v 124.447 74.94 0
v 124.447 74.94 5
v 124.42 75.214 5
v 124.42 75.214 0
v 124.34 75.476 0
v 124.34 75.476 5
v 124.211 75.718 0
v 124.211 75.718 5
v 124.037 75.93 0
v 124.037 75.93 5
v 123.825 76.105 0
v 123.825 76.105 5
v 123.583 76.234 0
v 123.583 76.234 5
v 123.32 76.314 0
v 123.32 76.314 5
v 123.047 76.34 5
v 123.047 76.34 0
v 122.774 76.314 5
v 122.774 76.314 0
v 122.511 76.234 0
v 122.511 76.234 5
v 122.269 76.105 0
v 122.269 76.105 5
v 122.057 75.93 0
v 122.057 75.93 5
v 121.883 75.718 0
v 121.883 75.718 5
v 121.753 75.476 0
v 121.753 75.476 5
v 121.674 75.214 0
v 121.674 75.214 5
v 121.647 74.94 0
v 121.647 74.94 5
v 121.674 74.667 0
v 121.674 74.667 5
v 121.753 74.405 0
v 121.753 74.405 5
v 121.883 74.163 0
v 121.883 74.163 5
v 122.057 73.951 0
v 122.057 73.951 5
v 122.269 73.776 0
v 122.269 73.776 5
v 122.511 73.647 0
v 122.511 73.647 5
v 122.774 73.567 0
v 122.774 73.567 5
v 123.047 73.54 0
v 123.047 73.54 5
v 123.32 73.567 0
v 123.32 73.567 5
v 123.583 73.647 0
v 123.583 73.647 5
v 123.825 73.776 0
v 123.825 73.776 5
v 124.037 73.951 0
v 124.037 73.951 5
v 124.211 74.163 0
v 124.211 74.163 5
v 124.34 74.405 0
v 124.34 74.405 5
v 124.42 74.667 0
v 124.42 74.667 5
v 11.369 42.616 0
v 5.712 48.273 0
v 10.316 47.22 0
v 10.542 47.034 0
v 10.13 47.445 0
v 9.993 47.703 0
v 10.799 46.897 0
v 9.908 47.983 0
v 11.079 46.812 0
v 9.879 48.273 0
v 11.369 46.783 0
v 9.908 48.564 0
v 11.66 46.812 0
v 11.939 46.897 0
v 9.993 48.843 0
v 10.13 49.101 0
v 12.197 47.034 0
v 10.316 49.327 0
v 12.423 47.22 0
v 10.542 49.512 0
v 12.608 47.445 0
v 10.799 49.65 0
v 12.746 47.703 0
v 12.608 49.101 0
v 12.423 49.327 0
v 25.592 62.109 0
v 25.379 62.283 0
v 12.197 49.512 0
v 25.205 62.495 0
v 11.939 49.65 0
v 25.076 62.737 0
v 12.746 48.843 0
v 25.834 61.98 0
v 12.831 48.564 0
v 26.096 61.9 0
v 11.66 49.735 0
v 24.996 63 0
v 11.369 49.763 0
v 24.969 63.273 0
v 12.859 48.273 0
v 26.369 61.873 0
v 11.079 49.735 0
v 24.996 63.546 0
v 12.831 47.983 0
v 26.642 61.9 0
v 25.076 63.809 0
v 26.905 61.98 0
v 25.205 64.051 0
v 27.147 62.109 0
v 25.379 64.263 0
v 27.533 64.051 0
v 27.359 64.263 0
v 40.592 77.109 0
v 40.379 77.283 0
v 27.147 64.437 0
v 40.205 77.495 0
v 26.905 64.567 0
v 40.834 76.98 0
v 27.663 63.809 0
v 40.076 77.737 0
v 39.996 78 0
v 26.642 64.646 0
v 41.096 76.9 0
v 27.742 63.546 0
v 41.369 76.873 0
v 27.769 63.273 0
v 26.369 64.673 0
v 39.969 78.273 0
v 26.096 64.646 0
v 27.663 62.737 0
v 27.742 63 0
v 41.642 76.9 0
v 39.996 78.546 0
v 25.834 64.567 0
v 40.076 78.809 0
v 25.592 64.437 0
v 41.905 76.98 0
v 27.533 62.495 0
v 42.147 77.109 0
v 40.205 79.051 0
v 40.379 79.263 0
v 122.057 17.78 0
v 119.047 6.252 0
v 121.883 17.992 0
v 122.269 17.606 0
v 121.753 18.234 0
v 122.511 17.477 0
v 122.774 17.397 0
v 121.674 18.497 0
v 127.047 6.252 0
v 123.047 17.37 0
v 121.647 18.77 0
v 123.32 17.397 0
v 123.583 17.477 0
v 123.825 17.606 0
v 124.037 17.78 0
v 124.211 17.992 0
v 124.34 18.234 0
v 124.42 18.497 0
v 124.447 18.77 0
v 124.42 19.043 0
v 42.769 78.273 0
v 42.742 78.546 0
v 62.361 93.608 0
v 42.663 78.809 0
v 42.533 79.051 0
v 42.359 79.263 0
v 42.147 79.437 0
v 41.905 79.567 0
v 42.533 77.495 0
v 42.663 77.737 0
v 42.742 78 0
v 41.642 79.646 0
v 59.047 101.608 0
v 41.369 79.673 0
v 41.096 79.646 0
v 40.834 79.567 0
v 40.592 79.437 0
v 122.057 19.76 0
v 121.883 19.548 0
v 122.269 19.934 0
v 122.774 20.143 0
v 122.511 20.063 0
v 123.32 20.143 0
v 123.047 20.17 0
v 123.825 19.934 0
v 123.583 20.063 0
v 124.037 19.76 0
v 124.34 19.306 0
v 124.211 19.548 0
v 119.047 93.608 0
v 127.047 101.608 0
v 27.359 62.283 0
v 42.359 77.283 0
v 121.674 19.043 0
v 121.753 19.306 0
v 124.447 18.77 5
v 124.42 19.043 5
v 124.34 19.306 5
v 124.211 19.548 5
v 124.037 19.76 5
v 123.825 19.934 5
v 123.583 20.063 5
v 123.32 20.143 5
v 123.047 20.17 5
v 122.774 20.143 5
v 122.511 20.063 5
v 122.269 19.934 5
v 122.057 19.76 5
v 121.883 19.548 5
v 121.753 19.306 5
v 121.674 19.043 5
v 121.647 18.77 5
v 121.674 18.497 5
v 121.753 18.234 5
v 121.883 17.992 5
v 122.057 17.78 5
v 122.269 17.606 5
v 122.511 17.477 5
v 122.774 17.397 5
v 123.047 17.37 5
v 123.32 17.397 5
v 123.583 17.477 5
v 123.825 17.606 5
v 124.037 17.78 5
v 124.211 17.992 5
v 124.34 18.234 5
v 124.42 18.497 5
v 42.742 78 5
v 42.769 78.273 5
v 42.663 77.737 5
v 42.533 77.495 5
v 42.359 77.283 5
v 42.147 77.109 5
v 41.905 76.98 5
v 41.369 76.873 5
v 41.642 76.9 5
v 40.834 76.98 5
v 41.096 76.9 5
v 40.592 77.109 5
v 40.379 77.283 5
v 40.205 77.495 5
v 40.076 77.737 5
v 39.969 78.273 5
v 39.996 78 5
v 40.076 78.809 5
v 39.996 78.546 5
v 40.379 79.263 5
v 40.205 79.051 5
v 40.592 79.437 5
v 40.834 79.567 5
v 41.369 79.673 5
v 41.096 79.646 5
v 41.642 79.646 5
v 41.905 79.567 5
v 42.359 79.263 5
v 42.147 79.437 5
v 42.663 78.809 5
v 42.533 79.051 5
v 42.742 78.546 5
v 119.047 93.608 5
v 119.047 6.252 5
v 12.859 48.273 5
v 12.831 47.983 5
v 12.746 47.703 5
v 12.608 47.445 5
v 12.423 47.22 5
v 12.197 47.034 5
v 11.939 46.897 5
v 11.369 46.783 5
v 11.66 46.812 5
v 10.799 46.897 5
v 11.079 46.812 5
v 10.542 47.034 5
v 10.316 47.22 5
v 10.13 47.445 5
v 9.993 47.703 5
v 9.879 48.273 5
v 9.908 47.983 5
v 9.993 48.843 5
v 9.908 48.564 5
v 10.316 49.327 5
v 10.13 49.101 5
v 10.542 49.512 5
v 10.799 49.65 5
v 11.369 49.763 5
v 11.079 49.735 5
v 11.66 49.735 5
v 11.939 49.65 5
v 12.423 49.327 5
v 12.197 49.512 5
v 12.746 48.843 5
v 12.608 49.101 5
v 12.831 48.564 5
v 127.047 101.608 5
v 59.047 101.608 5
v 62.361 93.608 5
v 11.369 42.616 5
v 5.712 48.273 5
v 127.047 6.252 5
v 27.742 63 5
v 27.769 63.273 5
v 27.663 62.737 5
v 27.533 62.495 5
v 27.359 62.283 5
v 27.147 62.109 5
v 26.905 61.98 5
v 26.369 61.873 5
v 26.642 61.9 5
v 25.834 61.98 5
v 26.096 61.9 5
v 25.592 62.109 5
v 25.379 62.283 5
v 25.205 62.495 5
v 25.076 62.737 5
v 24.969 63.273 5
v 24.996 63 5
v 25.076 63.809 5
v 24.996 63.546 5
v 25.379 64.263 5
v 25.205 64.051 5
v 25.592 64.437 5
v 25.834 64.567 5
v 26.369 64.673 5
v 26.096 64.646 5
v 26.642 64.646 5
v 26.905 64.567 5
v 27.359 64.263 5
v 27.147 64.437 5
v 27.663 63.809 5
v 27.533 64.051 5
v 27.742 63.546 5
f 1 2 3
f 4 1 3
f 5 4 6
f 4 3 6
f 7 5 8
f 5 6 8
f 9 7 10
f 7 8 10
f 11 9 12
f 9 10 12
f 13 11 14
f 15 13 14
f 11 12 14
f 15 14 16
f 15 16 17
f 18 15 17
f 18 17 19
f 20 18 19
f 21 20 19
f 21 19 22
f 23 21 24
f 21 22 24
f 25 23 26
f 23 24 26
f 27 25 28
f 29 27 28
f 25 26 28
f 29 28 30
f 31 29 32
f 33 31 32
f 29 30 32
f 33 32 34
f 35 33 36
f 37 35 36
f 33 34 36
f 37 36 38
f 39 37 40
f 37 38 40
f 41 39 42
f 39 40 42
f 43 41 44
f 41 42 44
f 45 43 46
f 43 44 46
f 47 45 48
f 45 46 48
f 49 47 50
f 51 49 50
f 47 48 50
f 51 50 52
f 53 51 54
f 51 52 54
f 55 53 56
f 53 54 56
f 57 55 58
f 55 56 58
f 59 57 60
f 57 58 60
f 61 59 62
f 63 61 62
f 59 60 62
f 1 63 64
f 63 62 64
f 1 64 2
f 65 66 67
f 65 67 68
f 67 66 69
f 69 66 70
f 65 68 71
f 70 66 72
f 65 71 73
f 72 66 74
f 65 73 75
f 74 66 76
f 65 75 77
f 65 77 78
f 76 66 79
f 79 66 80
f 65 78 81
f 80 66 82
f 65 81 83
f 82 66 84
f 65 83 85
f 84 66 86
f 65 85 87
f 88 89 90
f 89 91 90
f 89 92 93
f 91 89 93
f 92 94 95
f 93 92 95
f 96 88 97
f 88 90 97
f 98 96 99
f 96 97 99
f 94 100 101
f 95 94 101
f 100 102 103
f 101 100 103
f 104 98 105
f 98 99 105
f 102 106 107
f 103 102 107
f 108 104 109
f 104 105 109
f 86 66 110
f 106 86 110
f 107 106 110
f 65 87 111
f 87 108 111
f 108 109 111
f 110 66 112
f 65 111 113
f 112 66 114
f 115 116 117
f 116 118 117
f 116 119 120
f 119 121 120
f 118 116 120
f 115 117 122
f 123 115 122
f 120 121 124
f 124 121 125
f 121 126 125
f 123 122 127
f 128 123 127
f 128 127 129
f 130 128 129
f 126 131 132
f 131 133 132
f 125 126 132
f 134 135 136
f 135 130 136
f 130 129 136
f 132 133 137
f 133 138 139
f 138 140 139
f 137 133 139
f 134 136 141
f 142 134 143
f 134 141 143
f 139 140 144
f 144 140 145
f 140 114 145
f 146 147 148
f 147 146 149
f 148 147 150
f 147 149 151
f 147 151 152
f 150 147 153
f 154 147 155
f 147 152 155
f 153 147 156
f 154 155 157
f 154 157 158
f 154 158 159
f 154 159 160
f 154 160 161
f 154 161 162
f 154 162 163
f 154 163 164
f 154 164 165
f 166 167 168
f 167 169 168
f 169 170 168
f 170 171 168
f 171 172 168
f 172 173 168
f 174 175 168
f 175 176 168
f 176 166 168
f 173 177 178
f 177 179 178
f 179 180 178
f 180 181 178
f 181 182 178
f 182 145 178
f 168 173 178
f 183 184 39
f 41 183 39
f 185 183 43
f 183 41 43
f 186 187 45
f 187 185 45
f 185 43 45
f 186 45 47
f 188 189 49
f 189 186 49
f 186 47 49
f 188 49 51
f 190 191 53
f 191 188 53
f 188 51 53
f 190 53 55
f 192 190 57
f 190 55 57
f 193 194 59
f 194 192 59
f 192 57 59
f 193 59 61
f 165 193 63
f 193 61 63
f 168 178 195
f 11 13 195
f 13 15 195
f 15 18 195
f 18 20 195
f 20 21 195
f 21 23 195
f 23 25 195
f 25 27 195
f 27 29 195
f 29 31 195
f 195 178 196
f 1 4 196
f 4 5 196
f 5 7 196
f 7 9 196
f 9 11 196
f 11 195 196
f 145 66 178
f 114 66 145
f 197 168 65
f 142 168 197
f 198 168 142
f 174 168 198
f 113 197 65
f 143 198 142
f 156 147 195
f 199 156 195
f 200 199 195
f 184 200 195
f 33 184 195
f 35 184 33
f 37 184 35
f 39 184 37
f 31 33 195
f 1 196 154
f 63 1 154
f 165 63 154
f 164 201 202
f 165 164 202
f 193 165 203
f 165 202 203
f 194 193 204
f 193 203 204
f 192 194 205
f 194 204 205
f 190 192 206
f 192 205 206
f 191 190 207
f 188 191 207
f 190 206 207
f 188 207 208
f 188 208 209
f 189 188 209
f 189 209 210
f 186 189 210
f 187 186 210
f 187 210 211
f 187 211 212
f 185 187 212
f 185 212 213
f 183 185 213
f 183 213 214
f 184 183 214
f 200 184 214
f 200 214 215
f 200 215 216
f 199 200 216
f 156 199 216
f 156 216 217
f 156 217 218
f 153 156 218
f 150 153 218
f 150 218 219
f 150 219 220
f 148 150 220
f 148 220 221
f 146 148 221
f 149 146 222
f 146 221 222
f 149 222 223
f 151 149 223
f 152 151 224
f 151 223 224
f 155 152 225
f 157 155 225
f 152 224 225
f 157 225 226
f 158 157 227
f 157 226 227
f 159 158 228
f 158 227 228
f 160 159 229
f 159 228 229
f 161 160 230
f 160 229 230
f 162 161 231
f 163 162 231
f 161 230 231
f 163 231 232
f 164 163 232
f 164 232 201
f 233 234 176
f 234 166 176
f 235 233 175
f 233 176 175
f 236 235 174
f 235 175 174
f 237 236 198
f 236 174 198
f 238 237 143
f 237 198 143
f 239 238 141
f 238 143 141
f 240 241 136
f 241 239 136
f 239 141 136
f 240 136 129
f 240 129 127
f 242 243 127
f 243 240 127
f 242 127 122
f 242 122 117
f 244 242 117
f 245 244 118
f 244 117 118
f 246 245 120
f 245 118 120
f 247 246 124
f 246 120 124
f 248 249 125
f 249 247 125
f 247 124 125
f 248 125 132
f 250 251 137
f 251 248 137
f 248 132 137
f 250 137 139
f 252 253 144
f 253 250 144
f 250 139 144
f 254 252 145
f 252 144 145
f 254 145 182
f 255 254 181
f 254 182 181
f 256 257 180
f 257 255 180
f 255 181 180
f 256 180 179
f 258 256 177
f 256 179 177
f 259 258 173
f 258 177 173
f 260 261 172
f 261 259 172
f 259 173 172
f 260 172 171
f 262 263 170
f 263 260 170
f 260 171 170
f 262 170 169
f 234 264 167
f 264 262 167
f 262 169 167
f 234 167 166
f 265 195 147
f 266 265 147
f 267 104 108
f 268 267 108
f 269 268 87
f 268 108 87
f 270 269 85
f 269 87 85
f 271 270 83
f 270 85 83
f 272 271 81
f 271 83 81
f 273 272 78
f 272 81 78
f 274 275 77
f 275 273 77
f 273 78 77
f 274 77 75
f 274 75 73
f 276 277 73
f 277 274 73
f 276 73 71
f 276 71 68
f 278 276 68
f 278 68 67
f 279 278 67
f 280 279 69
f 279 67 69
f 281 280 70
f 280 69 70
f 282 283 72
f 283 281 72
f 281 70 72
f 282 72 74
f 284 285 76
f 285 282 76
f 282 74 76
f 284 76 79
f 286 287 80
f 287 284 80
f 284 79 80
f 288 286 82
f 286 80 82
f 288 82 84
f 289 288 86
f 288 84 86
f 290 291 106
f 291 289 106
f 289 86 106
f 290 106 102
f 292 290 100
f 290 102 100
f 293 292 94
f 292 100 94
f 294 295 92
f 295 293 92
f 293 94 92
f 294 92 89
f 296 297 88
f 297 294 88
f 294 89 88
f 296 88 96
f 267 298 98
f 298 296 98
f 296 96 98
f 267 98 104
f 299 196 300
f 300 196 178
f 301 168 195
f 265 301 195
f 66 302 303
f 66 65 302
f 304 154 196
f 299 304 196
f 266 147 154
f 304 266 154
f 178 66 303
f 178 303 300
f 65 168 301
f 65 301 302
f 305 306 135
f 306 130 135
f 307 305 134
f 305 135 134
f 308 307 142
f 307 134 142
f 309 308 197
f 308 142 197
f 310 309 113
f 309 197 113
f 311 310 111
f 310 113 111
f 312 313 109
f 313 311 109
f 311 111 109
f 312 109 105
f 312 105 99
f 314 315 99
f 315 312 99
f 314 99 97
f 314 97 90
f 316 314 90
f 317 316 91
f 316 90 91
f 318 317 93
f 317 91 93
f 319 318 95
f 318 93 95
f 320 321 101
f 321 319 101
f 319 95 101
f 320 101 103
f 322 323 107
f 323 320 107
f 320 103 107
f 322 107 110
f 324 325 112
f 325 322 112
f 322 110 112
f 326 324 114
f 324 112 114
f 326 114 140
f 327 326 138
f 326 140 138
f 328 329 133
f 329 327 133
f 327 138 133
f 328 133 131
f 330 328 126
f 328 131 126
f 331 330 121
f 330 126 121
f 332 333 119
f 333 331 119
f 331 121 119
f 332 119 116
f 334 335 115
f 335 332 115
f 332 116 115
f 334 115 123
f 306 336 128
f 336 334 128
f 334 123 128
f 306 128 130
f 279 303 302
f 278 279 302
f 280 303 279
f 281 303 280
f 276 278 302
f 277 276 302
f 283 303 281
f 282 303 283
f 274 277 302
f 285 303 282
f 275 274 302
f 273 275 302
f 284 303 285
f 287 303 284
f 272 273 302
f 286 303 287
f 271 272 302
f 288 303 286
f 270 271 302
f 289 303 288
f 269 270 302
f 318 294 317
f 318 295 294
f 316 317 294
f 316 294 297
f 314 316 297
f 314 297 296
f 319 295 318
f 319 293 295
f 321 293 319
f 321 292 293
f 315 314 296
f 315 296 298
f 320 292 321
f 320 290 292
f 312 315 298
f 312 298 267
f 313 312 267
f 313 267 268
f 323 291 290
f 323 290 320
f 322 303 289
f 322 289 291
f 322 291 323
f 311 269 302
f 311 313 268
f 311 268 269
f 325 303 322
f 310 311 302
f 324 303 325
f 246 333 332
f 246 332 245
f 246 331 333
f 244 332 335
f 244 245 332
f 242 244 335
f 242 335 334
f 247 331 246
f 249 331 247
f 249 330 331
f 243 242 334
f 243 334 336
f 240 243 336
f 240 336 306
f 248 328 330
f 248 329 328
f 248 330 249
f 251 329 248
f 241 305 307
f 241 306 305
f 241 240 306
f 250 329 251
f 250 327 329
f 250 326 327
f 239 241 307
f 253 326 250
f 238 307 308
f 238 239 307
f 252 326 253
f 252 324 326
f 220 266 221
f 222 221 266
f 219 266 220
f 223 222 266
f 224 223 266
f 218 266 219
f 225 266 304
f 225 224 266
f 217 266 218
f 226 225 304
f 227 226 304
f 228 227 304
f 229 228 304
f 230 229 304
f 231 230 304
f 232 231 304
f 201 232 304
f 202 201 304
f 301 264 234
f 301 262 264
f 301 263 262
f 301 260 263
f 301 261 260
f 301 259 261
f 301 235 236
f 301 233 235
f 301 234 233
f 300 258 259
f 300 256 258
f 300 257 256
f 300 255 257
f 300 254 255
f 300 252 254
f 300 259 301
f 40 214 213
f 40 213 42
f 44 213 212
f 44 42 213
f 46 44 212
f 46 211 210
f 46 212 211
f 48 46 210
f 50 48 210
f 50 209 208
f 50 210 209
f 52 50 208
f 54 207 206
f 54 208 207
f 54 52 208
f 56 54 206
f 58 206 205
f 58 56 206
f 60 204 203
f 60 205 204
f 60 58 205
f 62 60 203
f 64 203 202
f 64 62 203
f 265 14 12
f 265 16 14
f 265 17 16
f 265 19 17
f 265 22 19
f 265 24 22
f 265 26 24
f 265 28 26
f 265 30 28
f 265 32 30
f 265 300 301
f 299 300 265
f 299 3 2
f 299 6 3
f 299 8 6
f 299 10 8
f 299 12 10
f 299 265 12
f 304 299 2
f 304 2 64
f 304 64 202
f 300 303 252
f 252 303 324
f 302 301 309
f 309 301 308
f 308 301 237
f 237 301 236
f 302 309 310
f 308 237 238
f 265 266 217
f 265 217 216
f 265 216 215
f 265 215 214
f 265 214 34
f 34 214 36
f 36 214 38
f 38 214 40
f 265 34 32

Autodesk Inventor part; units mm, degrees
ref_plane "YZ Plane" through (0, 0, 0) normal (1, 0, 0) x (0, 1, 0)
ref_plane "XZ Plane" through (0, 0, 0) normal (0, 1, 0) x (-1, 0, 0)
ref_plane "XY Plane" through (0, 0, 0) normal (0, 0, 1) x (1, 0, 0)
ref_plane "Arbeitsebene1" through (0, 0, 0) normal (0, 0, 1) x (1, 0, 0)
sketch "Skizze1" plane through (0, 0, 0) normal (0, 0, 1) x (1, 0, 0)
  circle A0 centre (41.3693, 78.2732) radius 1.4 projected
  circle A1 centre (11.3693, 48.2732) radius 1.49 projected
  line L0 (5.7124, 48.2732) -> (41.3693, 83.9301) projected
  line L1 (47.0261, 78.2732) -> (11.3693, 42.6164) projected
  line L2 (41.3693, 83.9301) -> (47.0261, 78.2732) projected
  line L3 (11.3693, 42.6164) -> (5.7124, 48.2732) projected
  line L4 (47.0261, 78.2732) -> (41.3693, 83.9301)
  line L5 (41.3693, 83.9301) -> (59.0469, 101.6077)
  line L6 (59.0469, 101.6077) -> (64.7038, 95.9509)
  line L7 (64.7038, 95.9509) -> (47.0261, 78.2732)
  line L8 (59.0469, 101.6077) -> (59.0469, 93.6077)
  line L9 (59.0469, 93.6077) -> (119.0469, 93.6077)
  line L10 (119.0469, 93.6077) -> (119.0469, 101.6077)
  line L11 (119.0469, 101.6077) -> (59.0469, 101.6077)
  line L12 (119.0469, 101.6077) -> (119.0469, 6.2524)
  line L13 (119.0469, 6.2524) -> (127.0469, 6.2524)
  line L14 (127.0469, 6.2524) -> (127.0469, 101.6077)
  line L15 (127.0469, 101.6077) -> (119.0469, 101.6077)
  circle A2 centre (26.3693, 63.2732) radius 1.4
  point P0 (0, 0)
  point P1 (62.3606, 93.6077)
  dimension "d0" = 25
  dimension "d1" = 8
  dimension "d2" = 60
  dimension "d3" = 8
  dimension "d10" = 2.8
extrude "Extrusion1" add sketch "Skizze1" along normal blind 5
sketch "Skizze2" plane through (0, 0, 5) normal (0, 0, 1) x (1, 0, 0)
  line L0 (127.0469, 6.2524) -> (127.0469, 101.6077) projected
  line L1 (127.0469, 101.6077) -> (59.0469, 101.6077) projected
  line L2 (59.0469, 101.6077) -> (5.7124, 48.2732) projected
  line L3 (5.7124, 48.2732) -> (11.3693, 42.6164) projected
  line L4 (11.3693, 42.6164) -> (62.3606, 93.6077) projected
  line L5 (62.3606, 93.6077) -> (119.0469, 93.6077) projected
  line L6 (119.0469, 93.6077) -> (119.0469, 6.2524) projected
  line L7 (119.0469, 6.2524) -> (127.0469, 6.2524) projected
  circle A0 centre (11.3693, 48.2732) radius 1.49 projected
  circle A1 centre (41.3693, 78.2732) radius 1.4 projected
  circle A2 centre (123.0469, 18.77) radius 1.4
  circle A3 centre (123.0469, 74.9405) radius 1.4
  point P0 (0, 0)
  dimension "d6" = 2.8
  dimension "d7" = 2.8
extrude "Extrusion2" cut sketch "Skizze2" against normal blind 5 contours A2 | A3
properties part number "NematostellaImager_illuminationmount"
